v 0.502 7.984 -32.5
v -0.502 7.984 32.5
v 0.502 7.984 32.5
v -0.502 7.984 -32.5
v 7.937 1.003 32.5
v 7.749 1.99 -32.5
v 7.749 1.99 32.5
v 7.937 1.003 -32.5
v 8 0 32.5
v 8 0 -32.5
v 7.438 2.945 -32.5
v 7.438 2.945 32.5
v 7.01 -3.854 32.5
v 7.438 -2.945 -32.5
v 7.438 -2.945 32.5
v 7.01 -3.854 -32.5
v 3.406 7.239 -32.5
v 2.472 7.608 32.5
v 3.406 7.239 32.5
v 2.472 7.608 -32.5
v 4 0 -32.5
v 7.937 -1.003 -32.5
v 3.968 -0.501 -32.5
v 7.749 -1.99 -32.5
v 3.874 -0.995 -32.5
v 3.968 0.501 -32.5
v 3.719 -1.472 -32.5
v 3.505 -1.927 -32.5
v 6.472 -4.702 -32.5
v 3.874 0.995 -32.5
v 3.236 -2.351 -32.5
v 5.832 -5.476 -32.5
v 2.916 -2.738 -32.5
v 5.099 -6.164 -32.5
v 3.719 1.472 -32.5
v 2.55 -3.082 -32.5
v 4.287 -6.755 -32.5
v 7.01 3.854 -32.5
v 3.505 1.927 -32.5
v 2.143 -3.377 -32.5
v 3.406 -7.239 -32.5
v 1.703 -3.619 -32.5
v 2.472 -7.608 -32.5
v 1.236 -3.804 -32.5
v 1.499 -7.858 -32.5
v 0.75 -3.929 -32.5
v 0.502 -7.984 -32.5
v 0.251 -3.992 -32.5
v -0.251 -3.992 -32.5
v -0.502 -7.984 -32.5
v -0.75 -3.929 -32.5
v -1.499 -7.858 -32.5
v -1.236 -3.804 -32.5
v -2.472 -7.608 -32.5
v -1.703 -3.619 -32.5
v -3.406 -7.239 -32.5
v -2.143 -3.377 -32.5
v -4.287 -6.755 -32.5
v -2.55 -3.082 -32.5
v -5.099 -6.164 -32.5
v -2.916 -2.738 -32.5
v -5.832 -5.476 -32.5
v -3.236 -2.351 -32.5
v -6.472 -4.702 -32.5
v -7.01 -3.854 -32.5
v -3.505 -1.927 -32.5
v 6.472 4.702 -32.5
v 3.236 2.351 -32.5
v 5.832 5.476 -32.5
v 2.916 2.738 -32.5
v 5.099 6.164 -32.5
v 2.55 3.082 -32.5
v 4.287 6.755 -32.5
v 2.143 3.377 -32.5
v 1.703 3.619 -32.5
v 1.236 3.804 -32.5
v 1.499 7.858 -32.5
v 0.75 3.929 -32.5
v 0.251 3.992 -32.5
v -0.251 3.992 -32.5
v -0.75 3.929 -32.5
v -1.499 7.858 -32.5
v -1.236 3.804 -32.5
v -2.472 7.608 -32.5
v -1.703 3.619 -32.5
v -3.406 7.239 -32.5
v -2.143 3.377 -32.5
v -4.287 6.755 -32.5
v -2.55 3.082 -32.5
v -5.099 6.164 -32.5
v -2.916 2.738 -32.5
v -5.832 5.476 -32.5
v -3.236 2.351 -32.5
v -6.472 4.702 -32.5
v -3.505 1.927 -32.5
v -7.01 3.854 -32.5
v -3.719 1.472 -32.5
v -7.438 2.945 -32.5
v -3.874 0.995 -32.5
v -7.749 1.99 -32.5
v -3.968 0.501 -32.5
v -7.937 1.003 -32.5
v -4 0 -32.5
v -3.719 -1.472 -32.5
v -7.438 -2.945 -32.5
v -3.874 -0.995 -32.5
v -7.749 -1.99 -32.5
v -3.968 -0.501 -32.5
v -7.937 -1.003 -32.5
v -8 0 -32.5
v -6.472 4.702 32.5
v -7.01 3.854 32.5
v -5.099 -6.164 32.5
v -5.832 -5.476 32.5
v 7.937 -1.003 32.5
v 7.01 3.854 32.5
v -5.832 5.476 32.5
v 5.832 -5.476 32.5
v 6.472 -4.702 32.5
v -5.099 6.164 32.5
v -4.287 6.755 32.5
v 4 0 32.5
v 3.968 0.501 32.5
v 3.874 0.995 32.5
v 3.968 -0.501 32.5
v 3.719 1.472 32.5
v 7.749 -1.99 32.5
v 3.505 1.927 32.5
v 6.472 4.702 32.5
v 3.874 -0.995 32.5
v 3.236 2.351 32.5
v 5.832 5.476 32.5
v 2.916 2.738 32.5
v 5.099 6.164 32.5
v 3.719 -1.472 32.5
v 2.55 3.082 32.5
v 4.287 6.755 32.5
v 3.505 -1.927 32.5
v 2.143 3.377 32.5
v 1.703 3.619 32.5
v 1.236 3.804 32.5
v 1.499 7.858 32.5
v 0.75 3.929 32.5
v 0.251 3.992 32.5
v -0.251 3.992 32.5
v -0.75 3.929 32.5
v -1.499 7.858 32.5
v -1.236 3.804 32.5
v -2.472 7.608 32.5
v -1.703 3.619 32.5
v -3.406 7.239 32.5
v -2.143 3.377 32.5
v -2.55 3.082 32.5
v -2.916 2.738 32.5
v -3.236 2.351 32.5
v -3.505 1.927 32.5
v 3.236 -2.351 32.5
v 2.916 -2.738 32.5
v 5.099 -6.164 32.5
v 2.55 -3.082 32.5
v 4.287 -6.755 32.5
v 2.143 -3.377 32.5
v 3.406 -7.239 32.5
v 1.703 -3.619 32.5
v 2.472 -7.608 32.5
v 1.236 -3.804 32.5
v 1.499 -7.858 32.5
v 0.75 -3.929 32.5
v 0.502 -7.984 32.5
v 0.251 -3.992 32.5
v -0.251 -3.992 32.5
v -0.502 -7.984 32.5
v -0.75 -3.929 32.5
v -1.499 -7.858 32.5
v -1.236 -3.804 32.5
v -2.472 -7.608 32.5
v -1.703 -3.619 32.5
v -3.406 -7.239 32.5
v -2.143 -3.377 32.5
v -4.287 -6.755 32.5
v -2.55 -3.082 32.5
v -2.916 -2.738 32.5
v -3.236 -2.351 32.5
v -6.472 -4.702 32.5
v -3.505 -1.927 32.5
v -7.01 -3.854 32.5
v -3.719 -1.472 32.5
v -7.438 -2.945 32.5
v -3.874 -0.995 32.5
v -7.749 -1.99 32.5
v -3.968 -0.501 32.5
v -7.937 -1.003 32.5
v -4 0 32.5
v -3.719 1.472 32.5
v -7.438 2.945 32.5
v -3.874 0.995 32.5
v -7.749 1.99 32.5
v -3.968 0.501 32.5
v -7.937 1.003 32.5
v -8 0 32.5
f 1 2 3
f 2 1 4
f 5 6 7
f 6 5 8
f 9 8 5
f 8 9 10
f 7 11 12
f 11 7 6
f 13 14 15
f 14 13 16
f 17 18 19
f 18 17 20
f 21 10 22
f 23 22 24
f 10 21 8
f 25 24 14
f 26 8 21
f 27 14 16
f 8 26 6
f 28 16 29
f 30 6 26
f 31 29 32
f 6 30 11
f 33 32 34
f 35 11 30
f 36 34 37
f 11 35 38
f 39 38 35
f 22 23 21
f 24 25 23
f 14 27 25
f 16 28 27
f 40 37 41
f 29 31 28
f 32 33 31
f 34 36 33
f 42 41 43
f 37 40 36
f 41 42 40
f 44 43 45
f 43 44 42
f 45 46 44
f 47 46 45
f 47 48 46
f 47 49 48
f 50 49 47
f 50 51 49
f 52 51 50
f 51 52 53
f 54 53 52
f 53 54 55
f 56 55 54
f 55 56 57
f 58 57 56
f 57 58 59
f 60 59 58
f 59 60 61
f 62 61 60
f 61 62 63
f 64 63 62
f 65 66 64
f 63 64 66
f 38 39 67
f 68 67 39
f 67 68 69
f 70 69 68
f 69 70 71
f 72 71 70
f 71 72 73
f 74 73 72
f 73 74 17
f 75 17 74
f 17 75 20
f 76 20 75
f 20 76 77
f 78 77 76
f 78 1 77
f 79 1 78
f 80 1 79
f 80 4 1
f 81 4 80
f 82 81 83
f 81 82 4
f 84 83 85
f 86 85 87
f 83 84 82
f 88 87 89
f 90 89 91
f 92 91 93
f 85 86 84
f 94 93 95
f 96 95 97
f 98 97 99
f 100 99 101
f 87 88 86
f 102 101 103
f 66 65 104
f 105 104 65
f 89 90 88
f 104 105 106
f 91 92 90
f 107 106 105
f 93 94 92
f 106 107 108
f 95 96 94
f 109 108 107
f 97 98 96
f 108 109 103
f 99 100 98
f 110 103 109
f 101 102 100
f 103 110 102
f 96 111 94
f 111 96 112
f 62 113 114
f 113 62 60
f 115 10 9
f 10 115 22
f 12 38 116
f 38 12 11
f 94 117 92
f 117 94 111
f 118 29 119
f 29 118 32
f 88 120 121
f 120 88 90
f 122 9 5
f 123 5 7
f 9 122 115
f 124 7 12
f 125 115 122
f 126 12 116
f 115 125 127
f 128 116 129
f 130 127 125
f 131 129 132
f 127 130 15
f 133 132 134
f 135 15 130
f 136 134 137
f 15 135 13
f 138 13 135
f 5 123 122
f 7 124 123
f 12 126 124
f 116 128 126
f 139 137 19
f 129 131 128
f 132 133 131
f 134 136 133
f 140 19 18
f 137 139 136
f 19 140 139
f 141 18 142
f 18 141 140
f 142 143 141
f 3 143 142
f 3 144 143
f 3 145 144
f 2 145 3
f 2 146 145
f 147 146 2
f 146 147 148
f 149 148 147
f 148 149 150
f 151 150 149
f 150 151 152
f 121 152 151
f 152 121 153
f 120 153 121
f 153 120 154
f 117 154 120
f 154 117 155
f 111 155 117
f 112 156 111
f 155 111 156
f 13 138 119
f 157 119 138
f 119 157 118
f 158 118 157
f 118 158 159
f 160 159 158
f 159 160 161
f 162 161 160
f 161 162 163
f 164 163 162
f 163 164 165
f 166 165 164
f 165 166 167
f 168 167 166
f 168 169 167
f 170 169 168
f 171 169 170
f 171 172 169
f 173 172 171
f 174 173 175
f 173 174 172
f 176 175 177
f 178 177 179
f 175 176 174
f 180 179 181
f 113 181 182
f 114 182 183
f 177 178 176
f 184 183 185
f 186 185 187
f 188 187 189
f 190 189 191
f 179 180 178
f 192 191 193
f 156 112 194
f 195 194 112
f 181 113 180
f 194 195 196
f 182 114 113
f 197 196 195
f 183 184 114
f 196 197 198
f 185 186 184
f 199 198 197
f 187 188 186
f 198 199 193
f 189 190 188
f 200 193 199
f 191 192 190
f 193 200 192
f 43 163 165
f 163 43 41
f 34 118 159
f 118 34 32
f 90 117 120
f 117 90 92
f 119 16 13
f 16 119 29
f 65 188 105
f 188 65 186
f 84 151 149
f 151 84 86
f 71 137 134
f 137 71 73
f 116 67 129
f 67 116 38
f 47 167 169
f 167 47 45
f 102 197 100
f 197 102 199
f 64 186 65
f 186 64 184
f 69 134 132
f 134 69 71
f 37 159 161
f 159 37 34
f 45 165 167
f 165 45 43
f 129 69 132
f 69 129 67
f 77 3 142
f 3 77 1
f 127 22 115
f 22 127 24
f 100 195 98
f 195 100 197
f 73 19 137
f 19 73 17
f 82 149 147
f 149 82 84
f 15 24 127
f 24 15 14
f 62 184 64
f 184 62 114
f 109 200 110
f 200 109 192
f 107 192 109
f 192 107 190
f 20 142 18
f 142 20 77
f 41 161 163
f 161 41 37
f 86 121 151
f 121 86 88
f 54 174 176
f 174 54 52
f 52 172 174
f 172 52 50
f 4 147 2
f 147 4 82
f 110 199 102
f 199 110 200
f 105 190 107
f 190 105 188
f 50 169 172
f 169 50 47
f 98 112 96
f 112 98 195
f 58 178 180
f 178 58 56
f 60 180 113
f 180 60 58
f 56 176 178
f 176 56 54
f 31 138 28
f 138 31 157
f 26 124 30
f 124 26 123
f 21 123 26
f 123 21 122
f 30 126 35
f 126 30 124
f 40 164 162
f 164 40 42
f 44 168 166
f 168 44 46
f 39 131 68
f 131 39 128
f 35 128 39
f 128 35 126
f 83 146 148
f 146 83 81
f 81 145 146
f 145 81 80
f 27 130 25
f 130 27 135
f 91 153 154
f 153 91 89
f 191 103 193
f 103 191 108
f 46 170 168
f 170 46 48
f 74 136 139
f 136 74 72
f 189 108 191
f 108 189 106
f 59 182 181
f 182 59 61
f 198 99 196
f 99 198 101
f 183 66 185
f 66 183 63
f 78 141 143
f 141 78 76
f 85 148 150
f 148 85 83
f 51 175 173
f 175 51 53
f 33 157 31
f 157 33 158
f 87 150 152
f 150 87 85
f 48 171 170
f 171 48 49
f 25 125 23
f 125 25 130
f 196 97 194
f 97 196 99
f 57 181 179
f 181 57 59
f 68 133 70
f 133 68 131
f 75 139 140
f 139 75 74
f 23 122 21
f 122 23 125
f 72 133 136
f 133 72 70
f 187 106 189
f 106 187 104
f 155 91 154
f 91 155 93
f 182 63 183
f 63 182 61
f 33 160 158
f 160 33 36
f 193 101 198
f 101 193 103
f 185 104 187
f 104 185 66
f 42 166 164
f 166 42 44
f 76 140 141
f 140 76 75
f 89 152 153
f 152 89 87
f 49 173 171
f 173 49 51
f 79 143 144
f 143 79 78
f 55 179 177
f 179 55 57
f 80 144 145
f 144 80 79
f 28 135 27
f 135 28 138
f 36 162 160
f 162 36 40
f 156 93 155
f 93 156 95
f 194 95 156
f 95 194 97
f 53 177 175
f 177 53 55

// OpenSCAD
$fn = 50;


difference() {
	union() {
		translate(v = [0, 0, -32.5000000000]) {
			cylinder(h = 65, r = 8.0000000000);
		}
	}
	union() {
		translate(v = [0, 0, -100.0000000000]) {
			cylinder(h = 200, r = 4.0000000000);
		}
	}
}
